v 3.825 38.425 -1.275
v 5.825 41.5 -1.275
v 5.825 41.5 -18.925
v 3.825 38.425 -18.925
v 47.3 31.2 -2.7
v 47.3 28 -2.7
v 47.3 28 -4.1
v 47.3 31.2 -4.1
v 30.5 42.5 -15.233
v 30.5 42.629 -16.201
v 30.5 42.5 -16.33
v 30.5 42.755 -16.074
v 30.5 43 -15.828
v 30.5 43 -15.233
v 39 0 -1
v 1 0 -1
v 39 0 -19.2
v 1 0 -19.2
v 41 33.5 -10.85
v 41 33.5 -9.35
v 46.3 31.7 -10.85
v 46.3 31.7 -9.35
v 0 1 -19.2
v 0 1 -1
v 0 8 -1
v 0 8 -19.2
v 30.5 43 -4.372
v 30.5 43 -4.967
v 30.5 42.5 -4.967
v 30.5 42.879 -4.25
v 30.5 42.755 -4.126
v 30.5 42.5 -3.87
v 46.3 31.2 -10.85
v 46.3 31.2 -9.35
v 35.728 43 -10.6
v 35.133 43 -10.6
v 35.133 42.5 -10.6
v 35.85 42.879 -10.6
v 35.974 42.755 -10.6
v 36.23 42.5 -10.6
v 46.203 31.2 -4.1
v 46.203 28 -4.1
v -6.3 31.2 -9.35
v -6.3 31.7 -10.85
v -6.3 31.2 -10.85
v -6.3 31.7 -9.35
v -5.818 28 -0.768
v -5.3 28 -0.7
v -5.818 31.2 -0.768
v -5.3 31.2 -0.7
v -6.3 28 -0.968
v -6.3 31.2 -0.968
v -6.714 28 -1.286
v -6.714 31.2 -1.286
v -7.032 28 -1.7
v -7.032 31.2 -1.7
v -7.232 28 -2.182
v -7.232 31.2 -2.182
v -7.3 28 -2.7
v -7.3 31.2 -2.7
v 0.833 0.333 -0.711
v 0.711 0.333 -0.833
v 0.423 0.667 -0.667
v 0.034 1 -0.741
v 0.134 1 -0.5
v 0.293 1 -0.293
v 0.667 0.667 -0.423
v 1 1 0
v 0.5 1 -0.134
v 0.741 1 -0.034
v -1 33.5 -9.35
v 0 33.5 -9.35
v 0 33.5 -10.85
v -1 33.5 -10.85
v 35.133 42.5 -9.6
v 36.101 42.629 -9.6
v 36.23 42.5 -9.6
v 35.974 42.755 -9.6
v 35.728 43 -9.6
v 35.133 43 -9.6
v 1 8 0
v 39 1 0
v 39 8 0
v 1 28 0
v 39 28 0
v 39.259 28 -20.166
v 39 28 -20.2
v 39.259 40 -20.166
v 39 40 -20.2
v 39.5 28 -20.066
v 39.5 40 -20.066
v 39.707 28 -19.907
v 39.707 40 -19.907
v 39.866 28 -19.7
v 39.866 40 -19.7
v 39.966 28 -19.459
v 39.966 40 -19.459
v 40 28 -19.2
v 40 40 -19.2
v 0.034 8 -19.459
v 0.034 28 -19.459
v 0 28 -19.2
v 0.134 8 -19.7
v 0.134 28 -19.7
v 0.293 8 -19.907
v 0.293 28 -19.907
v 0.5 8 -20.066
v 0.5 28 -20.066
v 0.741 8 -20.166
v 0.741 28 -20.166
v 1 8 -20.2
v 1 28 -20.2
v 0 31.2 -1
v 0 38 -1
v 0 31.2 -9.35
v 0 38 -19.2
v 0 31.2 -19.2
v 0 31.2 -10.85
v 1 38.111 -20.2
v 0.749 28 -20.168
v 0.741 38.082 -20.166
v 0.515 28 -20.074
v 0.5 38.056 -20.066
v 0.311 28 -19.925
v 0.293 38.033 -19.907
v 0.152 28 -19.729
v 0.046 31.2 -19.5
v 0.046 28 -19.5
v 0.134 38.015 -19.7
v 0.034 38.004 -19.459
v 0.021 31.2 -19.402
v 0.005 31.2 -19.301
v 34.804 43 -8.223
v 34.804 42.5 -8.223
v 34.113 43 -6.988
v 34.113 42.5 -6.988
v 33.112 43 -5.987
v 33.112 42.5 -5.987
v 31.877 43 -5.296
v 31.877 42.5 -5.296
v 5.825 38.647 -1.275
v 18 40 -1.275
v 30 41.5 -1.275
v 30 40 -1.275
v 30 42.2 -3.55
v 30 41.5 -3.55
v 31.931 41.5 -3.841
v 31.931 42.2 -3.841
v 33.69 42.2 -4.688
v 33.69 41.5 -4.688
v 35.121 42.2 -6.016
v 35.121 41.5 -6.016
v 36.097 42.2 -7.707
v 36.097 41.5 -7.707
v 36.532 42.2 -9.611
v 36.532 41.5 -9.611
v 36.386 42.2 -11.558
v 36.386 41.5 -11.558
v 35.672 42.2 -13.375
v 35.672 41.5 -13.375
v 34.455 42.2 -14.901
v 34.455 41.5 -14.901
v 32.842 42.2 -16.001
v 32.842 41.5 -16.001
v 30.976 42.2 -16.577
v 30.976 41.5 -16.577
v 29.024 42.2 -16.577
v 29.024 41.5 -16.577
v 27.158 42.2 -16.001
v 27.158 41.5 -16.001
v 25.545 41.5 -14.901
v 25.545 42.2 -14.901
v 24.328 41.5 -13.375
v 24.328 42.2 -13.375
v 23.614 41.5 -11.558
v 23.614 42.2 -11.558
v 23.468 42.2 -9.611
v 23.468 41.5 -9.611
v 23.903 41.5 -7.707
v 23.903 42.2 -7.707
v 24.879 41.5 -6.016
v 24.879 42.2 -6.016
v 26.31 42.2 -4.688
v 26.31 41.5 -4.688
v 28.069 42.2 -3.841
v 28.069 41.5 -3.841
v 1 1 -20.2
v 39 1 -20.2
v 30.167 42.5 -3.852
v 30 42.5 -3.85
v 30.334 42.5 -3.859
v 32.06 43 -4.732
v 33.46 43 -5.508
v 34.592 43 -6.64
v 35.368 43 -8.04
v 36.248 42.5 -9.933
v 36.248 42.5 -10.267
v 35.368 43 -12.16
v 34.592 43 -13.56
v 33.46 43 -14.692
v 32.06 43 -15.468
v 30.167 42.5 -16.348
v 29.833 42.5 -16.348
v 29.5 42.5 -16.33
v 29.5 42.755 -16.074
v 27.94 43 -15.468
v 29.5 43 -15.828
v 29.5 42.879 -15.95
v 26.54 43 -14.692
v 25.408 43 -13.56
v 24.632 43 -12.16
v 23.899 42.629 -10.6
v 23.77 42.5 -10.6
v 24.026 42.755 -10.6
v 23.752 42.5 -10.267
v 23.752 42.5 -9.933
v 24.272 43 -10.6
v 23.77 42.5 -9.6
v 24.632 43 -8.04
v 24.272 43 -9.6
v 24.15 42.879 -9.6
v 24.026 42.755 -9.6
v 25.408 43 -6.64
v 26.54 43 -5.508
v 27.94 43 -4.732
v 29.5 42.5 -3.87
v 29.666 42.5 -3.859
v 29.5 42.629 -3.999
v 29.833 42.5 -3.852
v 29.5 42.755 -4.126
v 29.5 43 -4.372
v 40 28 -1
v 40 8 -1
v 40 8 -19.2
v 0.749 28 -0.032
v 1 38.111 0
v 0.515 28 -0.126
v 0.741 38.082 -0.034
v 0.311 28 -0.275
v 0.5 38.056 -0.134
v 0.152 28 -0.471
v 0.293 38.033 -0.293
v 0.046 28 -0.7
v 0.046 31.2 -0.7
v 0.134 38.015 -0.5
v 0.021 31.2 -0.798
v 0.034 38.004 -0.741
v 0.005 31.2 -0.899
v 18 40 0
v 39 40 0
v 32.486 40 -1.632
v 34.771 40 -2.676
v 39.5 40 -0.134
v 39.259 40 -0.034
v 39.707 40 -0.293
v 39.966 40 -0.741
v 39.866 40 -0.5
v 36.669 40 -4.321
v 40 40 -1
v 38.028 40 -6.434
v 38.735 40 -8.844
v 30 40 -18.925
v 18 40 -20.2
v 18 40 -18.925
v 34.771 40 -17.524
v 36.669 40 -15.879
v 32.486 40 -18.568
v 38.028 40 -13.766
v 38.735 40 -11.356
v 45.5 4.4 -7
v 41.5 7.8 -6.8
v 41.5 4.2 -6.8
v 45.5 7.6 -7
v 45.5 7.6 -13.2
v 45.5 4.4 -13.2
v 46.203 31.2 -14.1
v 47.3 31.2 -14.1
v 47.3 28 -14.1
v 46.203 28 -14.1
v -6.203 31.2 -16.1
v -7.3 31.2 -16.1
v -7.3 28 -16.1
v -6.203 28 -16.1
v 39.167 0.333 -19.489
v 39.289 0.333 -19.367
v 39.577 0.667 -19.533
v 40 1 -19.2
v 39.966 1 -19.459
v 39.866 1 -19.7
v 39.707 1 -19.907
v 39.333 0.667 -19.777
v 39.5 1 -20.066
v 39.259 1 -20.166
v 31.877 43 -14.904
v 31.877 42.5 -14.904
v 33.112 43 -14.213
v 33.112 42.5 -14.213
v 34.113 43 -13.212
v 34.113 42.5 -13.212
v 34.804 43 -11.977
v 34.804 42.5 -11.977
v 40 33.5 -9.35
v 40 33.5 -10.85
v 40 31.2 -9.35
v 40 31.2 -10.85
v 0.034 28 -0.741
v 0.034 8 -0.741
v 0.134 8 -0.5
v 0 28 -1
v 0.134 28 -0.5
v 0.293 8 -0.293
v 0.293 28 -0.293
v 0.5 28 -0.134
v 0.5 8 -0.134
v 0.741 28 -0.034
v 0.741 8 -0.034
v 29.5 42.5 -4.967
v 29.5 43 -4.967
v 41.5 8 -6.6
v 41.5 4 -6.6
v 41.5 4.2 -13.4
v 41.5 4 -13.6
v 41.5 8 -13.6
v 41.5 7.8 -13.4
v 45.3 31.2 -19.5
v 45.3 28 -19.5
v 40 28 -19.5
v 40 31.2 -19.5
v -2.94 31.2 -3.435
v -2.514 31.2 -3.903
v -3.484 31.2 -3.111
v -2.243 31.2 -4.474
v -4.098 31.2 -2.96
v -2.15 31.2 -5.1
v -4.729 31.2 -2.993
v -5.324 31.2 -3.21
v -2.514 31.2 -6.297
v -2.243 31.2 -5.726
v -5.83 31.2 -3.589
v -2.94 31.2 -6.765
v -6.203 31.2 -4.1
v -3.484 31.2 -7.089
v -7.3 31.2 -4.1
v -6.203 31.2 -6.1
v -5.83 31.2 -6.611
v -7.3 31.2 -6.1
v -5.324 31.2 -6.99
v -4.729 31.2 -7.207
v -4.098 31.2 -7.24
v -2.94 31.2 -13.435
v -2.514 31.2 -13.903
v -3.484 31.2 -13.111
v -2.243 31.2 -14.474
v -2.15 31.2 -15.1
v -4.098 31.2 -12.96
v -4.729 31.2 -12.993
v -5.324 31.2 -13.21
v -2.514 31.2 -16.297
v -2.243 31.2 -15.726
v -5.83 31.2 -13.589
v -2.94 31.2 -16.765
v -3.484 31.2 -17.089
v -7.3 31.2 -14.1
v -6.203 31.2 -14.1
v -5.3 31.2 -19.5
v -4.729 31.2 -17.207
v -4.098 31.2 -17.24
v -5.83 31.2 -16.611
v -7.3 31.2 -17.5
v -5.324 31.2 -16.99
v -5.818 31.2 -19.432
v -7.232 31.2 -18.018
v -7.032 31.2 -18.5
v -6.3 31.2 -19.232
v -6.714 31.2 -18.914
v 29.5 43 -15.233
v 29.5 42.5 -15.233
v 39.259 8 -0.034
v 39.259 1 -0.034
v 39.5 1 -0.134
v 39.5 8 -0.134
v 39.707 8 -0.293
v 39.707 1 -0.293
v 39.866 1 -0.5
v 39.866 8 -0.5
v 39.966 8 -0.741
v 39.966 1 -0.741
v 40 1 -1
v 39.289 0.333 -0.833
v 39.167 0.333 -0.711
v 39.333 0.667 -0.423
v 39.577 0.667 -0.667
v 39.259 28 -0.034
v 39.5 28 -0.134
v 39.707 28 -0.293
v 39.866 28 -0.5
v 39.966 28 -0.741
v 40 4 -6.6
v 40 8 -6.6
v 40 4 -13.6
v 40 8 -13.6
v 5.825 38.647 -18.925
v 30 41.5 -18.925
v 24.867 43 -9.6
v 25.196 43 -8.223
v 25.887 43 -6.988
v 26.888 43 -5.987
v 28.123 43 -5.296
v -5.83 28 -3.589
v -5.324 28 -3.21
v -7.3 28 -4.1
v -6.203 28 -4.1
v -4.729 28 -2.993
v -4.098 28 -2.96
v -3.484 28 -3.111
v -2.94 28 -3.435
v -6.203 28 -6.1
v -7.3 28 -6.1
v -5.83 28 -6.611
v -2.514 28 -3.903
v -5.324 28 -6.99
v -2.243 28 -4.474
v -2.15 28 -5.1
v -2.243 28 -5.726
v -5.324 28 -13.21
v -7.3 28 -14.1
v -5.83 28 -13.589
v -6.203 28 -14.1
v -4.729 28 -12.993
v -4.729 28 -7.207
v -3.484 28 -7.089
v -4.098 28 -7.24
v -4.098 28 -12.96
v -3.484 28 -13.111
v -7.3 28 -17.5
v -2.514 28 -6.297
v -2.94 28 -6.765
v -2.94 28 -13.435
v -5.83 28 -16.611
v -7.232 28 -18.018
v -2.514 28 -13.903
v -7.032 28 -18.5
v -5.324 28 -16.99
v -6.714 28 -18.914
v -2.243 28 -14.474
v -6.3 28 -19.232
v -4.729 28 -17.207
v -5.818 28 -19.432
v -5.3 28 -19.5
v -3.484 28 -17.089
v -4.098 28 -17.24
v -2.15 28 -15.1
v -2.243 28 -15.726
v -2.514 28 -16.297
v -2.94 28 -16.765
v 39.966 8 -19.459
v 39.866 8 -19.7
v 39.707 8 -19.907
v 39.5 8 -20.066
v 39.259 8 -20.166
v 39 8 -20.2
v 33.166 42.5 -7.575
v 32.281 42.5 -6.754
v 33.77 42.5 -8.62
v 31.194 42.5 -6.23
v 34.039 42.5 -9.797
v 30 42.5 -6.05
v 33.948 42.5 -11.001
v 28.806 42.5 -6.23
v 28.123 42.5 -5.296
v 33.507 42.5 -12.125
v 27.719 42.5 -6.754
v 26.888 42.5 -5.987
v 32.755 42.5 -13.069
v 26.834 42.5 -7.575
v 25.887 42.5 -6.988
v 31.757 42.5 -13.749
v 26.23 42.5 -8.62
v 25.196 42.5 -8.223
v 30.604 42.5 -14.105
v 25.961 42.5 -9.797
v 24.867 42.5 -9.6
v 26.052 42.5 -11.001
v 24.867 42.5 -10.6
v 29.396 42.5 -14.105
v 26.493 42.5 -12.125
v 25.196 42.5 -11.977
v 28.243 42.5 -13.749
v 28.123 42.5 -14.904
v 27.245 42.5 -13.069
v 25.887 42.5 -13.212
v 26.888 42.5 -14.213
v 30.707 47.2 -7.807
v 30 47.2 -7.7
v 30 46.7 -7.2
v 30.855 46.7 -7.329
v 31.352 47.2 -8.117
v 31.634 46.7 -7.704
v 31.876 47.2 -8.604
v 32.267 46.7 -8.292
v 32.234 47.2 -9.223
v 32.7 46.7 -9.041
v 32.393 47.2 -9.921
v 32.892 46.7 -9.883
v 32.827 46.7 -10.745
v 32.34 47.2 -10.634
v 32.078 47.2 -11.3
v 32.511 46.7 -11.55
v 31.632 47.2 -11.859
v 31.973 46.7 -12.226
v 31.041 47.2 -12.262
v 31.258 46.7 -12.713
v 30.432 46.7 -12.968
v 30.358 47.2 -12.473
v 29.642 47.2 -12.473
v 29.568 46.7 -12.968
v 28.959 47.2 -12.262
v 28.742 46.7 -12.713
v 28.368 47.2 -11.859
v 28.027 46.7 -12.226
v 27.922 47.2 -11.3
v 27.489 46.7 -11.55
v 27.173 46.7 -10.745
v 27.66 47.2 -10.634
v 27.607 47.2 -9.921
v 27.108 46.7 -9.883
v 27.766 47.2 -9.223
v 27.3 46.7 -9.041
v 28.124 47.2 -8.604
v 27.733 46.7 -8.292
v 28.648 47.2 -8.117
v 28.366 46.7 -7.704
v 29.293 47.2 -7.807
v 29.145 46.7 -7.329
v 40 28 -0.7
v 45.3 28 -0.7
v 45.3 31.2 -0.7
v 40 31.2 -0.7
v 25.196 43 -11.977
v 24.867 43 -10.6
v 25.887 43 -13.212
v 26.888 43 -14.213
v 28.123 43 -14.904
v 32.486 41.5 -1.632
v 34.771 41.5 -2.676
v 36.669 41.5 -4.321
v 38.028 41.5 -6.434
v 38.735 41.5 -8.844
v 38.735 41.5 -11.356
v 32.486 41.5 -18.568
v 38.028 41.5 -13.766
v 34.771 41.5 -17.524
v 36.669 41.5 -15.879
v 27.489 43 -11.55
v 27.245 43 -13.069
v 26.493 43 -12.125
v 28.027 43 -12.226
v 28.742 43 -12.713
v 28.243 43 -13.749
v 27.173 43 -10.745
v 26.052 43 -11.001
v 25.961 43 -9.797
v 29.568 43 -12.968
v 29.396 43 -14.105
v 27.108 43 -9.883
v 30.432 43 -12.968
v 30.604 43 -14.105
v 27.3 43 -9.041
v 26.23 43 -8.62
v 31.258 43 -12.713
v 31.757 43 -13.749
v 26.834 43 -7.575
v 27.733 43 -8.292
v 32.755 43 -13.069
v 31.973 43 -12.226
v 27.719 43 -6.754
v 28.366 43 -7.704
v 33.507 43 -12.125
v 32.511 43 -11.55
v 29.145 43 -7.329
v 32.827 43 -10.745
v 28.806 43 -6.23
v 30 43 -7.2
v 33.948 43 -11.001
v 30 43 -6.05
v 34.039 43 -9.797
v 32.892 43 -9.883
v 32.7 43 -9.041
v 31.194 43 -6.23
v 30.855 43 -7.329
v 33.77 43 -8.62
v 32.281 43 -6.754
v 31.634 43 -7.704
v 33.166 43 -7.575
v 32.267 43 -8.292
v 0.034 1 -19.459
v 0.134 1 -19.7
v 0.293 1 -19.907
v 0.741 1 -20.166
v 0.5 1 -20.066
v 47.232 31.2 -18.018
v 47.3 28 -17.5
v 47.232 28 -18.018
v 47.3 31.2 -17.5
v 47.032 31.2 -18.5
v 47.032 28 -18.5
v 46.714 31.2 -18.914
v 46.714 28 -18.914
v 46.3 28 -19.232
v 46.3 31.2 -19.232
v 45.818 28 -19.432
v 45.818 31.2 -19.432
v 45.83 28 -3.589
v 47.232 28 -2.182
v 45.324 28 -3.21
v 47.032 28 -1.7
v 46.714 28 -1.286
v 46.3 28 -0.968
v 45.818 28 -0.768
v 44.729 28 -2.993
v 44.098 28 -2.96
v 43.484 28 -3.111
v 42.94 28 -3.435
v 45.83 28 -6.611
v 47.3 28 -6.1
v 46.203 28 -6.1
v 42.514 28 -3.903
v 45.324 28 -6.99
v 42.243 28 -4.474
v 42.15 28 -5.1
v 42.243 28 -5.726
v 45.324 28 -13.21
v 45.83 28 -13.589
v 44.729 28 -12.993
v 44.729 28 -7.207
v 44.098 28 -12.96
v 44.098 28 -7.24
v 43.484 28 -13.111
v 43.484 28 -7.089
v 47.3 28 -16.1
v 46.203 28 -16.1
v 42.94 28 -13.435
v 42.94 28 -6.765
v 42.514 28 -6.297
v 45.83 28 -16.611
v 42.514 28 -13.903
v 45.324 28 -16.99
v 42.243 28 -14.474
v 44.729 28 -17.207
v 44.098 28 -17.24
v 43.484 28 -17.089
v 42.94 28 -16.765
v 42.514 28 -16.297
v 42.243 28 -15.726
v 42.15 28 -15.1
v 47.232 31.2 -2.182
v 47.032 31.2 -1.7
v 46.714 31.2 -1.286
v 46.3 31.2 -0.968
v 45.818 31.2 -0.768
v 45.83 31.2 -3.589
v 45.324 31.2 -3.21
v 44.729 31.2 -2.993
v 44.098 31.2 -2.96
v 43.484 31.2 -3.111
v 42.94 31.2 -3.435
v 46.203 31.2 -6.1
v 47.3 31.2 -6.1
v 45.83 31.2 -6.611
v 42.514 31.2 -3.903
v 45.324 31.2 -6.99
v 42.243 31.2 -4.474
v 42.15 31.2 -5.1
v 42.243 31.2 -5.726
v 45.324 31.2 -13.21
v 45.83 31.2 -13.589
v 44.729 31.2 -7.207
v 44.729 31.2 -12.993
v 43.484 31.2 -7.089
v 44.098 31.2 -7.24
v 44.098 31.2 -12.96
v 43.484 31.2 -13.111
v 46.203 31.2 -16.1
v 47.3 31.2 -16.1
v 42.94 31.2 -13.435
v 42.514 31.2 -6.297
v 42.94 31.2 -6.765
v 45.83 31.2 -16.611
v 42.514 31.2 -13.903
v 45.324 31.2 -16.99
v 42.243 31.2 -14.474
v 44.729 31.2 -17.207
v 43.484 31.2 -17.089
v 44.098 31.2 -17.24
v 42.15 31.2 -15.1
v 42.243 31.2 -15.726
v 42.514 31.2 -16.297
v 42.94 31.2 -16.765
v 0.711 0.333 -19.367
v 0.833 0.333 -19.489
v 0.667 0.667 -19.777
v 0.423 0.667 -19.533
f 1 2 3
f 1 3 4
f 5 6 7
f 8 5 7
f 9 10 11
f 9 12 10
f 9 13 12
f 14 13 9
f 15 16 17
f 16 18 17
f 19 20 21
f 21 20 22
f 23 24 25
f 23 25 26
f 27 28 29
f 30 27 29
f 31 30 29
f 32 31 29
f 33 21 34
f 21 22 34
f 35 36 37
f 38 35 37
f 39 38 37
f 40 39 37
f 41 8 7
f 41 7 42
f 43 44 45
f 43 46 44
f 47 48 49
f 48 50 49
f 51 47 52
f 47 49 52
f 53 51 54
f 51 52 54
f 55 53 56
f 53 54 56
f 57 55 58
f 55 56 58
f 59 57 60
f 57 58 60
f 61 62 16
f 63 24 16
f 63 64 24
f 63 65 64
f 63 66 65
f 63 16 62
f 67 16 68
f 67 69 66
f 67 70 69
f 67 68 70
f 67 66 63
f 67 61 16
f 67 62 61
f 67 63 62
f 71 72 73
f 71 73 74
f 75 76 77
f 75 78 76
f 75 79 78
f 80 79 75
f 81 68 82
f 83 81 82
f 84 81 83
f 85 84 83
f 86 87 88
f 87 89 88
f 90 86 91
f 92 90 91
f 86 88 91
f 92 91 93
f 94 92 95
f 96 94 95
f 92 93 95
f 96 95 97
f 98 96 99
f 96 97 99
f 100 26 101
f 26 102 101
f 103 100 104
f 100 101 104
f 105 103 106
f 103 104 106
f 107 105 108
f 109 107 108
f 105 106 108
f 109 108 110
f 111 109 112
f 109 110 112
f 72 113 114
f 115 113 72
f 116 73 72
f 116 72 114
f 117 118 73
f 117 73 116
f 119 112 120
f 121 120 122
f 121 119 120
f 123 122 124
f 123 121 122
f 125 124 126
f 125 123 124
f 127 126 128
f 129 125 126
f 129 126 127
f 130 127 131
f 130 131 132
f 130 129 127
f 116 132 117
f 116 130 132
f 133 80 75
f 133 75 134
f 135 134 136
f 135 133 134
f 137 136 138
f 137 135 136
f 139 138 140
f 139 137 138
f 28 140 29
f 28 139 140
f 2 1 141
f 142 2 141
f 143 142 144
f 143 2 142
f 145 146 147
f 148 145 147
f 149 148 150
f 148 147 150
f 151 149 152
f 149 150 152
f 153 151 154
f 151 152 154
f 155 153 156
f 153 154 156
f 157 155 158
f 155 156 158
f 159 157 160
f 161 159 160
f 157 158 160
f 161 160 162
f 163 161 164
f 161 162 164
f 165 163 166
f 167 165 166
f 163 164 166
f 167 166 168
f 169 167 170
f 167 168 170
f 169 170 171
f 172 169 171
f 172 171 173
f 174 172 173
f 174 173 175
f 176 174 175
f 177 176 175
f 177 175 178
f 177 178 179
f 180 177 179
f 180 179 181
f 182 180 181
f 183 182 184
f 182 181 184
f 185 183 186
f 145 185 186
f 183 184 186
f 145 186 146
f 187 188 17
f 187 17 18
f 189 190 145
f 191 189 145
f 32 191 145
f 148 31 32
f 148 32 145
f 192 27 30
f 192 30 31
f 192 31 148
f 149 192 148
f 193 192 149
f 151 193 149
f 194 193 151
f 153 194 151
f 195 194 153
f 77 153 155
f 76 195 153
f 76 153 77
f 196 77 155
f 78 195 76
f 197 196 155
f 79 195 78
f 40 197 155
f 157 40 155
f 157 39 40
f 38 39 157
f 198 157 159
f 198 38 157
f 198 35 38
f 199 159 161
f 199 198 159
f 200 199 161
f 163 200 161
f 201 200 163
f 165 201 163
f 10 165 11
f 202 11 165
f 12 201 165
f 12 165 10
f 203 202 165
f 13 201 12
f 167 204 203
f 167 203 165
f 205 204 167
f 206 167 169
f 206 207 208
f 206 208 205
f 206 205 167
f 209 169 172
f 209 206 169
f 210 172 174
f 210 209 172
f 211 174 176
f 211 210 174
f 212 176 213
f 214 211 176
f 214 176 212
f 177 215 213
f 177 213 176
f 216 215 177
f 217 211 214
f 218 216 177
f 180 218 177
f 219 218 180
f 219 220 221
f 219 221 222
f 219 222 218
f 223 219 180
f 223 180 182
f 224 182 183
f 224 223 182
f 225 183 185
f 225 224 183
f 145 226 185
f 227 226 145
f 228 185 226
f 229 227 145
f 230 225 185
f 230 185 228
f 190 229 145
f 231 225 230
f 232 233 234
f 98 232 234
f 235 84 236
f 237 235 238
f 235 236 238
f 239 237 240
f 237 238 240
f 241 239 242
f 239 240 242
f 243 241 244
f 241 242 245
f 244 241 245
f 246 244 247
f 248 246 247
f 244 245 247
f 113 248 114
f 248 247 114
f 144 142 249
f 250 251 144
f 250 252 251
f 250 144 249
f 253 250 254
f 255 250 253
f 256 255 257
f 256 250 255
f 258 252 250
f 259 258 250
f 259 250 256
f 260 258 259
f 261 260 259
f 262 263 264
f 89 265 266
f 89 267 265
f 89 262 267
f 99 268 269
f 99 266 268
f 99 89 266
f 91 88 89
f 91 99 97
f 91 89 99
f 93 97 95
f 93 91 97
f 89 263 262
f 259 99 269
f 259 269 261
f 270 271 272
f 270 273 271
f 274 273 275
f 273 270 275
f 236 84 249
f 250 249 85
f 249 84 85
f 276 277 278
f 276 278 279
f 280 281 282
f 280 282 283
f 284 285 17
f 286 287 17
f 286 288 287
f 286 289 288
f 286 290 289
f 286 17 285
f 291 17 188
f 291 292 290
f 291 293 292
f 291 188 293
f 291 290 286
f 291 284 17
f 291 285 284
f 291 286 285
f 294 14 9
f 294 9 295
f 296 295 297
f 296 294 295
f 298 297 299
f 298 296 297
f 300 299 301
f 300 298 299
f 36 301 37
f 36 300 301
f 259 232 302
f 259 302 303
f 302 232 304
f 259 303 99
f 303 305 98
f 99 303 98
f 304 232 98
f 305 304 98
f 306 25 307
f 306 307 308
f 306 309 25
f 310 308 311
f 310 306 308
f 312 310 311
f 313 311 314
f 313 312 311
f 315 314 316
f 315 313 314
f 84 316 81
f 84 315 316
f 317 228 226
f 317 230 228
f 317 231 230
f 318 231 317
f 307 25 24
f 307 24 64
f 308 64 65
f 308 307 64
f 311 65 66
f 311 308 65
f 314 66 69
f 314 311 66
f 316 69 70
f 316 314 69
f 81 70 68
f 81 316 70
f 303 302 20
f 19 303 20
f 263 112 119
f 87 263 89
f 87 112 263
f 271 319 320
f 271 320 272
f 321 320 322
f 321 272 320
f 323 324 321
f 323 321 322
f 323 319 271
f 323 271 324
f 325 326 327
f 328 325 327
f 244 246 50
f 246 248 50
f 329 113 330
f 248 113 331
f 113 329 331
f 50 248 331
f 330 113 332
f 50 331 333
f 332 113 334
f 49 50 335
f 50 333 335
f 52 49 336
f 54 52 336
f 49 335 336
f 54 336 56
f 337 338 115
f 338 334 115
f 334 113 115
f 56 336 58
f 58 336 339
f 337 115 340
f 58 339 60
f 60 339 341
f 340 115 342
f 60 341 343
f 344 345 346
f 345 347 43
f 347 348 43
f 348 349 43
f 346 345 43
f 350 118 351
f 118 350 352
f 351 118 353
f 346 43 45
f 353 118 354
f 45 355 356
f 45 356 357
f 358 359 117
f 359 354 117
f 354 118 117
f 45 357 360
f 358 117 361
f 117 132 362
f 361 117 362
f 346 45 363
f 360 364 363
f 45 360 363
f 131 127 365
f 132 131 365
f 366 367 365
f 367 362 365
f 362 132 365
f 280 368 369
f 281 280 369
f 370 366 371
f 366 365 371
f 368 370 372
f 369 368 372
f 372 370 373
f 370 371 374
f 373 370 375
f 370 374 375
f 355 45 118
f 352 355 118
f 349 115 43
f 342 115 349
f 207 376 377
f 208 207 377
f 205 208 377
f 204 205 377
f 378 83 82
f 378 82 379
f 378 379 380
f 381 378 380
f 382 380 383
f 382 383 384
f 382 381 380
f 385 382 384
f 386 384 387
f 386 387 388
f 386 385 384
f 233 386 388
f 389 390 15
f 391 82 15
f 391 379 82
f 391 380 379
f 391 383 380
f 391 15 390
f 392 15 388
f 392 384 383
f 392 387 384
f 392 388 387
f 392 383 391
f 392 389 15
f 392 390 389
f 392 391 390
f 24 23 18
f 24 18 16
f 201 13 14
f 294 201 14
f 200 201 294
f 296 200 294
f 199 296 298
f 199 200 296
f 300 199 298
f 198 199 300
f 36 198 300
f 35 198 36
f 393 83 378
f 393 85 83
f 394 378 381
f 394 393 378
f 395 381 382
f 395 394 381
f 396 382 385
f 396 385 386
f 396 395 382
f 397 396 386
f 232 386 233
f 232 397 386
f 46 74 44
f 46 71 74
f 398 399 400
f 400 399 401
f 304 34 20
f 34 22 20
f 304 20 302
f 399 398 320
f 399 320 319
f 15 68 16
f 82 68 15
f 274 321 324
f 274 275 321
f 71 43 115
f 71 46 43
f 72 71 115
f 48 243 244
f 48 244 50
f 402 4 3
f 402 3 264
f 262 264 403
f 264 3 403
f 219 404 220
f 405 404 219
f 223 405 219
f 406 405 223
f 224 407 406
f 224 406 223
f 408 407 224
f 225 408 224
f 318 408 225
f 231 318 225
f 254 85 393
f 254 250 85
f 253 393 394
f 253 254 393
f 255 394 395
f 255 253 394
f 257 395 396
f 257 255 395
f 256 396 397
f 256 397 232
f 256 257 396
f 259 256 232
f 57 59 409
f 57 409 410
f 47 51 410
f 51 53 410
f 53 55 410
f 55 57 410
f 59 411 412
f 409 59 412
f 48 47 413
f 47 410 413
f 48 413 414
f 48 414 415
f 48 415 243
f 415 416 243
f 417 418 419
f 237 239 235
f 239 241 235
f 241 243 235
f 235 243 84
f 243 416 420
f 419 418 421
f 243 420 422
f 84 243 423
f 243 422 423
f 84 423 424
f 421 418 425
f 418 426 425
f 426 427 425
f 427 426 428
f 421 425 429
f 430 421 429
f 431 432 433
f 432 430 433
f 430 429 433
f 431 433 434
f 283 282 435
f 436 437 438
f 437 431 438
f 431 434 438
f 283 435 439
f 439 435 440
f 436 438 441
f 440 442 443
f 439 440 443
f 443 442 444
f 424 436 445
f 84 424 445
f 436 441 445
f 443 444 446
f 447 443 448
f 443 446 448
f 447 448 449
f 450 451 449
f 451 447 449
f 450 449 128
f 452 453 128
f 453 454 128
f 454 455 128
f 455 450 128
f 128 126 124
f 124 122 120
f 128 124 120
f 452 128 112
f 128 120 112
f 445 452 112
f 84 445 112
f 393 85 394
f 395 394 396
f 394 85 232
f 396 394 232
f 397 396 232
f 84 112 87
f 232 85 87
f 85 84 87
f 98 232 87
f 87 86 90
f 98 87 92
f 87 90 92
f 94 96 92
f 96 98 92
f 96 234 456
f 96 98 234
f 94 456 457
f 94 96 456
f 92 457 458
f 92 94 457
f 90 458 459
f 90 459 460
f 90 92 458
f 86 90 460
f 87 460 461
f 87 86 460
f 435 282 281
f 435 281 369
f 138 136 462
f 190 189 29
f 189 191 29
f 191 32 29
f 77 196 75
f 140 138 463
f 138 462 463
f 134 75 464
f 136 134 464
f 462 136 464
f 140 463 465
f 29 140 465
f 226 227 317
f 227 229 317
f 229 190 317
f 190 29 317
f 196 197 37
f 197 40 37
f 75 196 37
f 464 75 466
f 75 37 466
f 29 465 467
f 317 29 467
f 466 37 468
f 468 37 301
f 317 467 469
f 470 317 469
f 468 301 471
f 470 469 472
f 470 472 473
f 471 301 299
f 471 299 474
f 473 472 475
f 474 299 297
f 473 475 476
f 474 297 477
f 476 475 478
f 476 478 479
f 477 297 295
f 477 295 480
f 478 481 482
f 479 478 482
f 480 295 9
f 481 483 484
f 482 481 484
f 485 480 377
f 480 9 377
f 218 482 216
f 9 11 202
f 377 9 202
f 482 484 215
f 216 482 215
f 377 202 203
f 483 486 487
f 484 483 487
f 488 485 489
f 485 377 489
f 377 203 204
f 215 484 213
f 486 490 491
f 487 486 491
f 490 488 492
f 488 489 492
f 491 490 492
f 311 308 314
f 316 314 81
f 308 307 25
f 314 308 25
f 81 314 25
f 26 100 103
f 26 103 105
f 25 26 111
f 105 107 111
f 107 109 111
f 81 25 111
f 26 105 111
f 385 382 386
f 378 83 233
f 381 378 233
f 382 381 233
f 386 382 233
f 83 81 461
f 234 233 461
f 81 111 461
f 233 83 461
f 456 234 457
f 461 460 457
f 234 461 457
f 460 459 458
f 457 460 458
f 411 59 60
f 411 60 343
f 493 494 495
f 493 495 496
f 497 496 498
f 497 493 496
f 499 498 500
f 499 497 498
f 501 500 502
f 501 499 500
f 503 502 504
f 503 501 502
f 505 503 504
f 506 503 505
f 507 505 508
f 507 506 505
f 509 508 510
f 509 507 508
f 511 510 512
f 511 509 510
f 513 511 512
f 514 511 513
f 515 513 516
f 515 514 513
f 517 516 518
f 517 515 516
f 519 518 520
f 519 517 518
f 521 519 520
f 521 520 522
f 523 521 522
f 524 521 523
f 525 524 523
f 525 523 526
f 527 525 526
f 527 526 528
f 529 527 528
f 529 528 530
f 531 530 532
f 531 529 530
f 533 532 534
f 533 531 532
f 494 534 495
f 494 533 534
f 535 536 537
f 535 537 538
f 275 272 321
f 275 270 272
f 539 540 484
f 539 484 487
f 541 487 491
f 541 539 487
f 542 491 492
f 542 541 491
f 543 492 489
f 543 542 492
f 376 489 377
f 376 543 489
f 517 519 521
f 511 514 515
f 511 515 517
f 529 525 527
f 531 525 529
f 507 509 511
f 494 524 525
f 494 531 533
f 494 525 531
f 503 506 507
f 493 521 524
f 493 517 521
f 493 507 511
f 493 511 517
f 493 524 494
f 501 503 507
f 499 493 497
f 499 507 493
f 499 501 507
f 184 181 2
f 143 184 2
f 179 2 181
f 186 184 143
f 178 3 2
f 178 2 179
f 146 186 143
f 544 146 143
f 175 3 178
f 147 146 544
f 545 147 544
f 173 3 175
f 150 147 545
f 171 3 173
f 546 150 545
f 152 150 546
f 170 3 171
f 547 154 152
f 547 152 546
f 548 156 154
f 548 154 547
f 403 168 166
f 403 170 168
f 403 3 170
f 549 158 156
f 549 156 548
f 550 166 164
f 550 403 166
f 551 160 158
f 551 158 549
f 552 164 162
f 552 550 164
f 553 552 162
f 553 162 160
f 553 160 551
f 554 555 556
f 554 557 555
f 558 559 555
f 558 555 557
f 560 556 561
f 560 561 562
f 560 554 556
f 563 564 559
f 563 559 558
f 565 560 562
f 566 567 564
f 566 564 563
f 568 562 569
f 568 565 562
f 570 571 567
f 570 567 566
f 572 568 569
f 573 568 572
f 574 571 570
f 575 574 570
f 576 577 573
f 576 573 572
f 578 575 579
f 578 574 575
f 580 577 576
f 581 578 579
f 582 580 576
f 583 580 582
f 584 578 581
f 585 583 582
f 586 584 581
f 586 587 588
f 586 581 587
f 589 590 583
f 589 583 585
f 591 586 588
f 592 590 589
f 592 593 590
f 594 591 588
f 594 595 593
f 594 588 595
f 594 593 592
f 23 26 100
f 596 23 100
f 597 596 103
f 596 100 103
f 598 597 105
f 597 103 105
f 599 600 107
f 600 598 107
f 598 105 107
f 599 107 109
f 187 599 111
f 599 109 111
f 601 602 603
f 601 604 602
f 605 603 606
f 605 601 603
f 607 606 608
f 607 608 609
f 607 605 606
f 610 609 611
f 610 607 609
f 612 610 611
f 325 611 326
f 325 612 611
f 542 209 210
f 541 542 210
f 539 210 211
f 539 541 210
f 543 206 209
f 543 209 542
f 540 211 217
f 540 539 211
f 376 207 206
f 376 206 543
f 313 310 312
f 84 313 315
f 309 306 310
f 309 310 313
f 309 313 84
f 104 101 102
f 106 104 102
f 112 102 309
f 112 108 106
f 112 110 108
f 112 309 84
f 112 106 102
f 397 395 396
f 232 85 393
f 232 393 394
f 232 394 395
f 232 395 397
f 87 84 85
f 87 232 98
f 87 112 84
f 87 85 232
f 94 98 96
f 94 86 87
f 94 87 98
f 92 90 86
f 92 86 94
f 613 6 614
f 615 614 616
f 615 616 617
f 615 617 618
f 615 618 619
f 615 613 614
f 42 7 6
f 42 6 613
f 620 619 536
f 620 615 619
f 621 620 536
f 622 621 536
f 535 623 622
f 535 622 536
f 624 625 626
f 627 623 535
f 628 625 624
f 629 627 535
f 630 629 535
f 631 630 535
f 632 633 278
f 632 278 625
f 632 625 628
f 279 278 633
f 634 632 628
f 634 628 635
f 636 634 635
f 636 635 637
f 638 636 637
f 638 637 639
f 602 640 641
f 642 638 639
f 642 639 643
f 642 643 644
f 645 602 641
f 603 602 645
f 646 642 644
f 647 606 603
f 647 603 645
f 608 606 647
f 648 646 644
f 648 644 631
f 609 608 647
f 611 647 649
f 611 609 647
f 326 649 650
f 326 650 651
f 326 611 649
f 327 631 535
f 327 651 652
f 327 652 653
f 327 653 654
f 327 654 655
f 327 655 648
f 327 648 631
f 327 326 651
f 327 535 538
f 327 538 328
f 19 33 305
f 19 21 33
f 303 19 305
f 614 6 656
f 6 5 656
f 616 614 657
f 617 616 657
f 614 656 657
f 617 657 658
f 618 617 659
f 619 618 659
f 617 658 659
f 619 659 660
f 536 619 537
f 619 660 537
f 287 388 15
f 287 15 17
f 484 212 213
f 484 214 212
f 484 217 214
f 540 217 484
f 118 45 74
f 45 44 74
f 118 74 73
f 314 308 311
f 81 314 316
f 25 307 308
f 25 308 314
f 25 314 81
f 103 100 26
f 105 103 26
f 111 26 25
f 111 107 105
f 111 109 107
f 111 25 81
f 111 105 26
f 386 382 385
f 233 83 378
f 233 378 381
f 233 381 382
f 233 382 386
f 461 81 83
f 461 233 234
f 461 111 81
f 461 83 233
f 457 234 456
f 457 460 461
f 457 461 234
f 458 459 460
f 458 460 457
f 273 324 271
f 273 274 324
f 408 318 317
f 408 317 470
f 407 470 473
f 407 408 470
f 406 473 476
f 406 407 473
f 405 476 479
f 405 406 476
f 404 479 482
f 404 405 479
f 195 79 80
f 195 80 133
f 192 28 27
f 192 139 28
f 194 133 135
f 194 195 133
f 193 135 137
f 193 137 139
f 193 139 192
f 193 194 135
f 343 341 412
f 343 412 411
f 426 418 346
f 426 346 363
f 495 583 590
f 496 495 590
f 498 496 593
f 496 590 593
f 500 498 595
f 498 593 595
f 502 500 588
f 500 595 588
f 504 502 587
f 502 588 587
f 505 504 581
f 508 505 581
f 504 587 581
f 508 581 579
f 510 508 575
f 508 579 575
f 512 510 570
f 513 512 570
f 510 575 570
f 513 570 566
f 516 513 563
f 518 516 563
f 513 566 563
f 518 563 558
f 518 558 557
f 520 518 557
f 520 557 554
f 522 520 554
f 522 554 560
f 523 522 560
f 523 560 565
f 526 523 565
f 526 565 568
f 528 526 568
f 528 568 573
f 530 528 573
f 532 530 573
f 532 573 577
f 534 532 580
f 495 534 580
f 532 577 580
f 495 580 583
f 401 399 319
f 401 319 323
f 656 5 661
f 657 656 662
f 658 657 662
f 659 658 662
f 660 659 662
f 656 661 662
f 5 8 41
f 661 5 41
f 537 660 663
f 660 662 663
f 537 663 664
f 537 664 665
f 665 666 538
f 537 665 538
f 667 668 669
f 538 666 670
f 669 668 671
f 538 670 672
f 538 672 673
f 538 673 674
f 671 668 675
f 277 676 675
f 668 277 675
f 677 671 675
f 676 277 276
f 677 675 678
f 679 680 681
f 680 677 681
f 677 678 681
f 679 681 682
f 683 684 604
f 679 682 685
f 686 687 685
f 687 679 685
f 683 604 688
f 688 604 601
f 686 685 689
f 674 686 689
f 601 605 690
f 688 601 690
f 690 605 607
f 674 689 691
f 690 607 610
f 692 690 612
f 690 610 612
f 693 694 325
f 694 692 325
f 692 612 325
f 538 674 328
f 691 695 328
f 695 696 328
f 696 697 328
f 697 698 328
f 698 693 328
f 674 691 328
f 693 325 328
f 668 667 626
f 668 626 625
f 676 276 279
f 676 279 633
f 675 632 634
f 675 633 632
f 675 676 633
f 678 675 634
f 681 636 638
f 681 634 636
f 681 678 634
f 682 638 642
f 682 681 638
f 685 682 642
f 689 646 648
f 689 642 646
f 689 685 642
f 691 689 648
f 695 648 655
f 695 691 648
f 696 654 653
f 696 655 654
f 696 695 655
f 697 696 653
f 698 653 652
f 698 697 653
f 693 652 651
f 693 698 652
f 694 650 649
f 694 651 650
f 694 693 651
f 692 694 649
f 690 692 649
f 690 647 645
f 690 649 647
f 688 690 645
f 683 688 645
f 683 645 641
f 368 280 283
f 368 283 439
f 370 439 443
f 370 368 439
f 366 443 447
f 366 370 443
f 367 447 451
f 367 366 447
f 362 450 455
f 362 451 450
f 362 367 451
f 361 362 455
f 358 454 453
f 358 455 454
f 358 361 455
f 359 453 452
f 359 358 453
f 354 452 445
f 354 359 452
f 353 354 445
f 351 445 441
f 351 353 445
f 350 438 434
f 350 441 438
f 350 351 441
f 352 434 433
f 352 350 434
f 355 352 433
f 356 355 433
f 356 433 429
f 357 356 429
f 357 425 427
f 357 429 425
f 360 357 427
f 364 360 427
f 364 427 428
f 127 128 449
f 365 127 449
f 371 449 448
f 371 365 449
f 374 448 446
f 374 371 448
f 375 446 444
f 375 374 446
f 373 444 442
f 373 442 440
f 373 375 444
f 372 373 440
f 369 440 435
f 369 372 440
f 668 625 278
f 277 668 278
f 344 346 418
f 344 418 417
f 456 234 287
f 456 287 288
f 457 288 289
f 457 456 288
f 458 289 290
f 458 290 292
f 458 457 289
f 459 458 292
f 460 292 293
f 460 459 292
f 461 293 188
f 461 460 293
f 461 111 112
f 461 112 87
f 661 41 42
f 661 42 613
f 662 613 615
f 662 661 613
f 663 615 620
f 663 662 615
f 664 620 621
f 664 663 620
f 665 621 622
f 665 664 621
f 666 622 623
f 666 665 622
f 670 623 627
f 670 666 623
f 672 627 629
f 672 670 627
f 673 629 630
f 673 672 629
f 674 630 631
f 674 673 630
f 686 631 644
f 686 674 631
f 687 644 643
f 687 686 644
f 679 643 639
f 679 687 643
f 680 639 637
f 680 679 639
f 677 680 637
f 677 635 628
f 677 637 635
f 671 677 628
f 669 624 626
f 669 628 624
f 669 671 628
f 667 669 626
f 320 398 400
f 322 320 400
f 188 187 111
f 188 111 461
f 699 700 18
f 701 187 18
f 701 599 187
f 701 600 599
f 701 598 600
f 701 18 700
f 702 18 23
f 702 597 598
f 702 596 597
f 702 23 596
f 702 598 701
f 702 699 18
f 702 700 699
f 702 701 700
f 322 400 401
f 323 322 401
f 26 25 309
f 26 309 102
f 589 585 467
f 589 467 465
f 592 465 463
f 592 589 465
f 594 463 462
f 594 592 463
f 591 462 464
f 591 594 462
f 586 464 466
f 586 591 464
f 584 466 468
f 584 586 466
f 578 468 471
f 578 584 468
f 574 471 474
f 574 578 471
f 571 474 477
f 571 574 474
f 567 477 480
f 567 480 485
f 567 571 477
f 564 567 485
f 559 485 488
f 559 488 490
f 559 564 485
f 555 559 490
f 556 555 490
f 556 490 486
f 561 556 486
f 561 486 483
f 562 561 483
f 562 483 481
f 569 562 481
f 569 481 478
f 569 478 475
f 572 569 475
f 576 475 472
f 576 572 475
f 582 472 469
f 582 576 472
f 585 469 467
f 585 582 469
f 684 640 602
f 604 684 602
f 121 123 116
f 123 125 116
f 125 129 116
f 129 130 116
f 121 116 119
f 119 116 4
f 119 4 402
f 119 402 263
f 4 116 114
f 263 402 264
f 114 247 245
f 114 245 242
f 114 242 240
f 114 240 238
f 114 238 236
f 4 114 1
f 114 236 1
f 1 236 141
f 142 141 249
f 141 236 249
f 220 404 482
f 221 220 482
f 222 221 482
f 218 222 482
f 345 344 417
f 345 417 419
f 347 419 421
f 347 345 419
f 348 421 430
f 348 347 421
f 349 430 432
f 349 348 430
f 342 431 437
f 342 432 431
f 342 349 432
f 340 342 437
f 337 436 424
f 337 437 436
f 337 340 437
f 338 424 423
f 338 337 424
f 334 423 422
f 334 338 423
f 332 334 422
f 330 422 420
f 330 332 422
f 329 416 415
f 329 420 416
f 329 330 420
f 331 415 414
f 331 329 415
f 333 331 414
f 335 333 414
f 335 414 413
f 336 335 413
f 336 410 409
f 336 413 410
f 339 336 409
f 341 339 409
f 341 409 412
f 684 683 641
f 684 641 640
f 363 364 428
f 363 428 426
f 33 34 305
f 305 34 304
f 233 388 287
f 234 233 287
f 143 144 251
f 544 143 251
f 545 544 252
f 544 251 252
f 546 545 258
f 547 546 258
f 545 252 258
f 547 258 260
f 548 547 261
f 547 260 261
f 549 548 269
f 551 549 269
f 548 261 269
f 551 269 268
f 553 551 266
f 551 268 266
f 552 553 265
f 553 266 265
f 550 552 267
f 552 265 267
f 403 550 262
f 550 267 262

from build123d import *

# Parameters (mm, degrees)
SKETCH1_W                       = 40
SKETCH1_H                       = 20.2
BOSS_EXTRUDE1_DEPTH             = 8
SKETCH3_W                       = 40
SKETCH3_H                       = 20.2
BOSS_EXTRUDE2_DEPTH             = 20
SKETCH4_W                       = 40
SKETCH4_H                       = 20.2
BOSS_EXTRUDE5_DEPTH             = 12
CUT_EXTRUDE1_DEPTH              = 61.066962633
SKETCH6_W                       = 7.3
SKETCH6_H                       = 18.8
BOSS_EXTRUDE6_DEPTH             = 3.2
BOSS_EXTRUDE6_2_DEPTH           = 3.2
CUT_EXTRUDE2_DEPTH              = 61.156213312
BOSS_EXTRUDE7_DEPTH             = 0.75
FILLET1_R                       = 2
FILLET3_R                       = 2
BOSS_EXTRUDE8_DEPTH             = 1.5
BOSS_EXTRUDE8_DIRECTION_2_REACH = 67.156
BOSS_EXTRUDE9_DEPTH             = 17.65
SKETCH11_R                      = 6.55
BOSS_EXTRUDE10_DEPTH            = 1.5
CHAMFER1_SIZE                   = 0.8
SKETCH12_R                      = 4.05
CUT_EXTRUDE3_DEPTH              = 0.5
SKETCH13_R                      = 2.9
BOSS_EXTRUDE11_DEPTH            = 4.2
CHAMFER2_SIZE                   = 0.5
FILLET4_R                       = 1
FILLET5_R                       = 1
FILLET6_R                       = 1
CHAMFER3_SIZE                   = 1
SKETCH14_W                      = 7
SKETCH14_H                      = 4
BOSS_EXTRUDE13_DEPTH            = 1.5


with BuildPart() as part:
    # Sketch1 → Boss-Extrude1 (new body)
    with BuildSketch(Plane(origin=(0, 0, 0), x_dir=(1, 0, 0), z_dir=(0, 1, 0))):
        with Locations((20, 10.1)):
            Rectangle(SKETCH1_W, SKETCH1_H)
    extrude(amount=BOSS_EXTRUDE1_DEPTH)

    # Fillet5
    fillet5_edges = [part.edges().sort_by_distance(p)[0] for p in [
        (0, 4, -20.2),
        (40, 4, -20.2),
        (40, 4, 0),
        (0, 4, 0),
    ]]
    fillet(fillet5_edges, radius=FILLET5_R)

    # Chamfer3
    chamfer3_edges = [part.edges().sort_by_distance(p)[0] for p in [
        (20, 0, 0),
        (0, 0, -10.1),
        (20, 0, -20.2),
        (40, 0, -10.1),
        (39.707106781, 0, -19.907106781),
        (39.707106781, 0, -0.292893219),
        (0.292893219, 0, -19.907106781),
        (0.292893219, 0, -0.292893219),
    ]]
    chamfer(chamfer3_edges, length=CHAMFER3_SIZE)


with BuildPart() as body_2:
    # Sketch3 → Boss-Extrude2 (new body)
    with BuildSketch(Plane(origin=(0, 8, 0), x_dir=(1, 0, 0), z_dir=(0, 1, 0))):
        with Locations((20, 10.1)):
            Rectangle(SKETCH3_W, SKETCH3_H)
    extrude(amount=BOSS_EXTRUDE2_DEPTH)

    # Fillet6
    fillet6_edges = [body_2.edges().sort_by_distance(p)[0] for p in [
        (0, 18, -20.2),
        (40, 18, -20.2),
        (40, 18, 0),
        (0, 18, 0),
    ]]
    fillet(fillet6_edges, radius=FILLET6_R)


with BuildPart() as body_3:
    # Sketch4 → Boss-Extrude5 (new body)
    with BuildSketch(Plane(origin=(0, 28, 0), x_dir=(1, 0, 0), z_dir=(0, 1, 0))):
        with Locations((20, 10.1)):
            Rectangle(SKETCH4_W, SKETCH4_H)
    extrude(amount=BOSS_EXTRUDE5_DEPTH)

    # Sketch5 → Cut-Extrude1 (cut, through all)
    with BuildSketch(Plane.XY):
        Polygon((0, 38), (18, 40), (0, 40), align=None)
    extrude(amount=-CUT_EXTRUDE1_DEPTH, mode=Mode.SUBTRACT)



with BuildPart() as body_4:
    # Sketch6 → Boss-Extrude6 (new body)
    with BuildSketch(Plane(origin=(0, 28, 0), x_dir=(-1, 0, 0), z_dir=(0, -1, 0))):
        with Locations((3.65, 10.1)):
            Rectangle(SKETCH6_W, SKETCH6_H)
    extrude(amount=-BOSS_EXTRUDE6_DEPTH)


with BuildPart() as body_5:
    # Sketch6 → Boss-Extrude6 2 (new body)
    with BuildSketch(Plane(origin=(0, 28, 0), x_dir=(-1, 0, 0), z_dir=(0, -1, 0))):
        with Locations((-43.65, 10.1)):
            Rectangle(SKETCH6_W, SKETCH6_H)
    extrude(amount=-BOSS_EXTRUDE6_2_DEPTH)


with BuildPart() as cut_extrude2_tool:
    # Sketch7 → Cut-Extrude2 (new, through all)
    with BuildSketch(Plane(origin=(0, 31.2, 0), x_dir=(1, 0, 0), z_dir=(0, 1, 0))):
        with BuildLine():
            Line((-6.203286631, 4.1), (-7.3, 4.1))
            Line((-7.3, 4.1), (-7.3, 6.1))
            Line((-7.3, 6.1), (-6.203286631, 6.1))
            ThreePointArc((-6.203286631, 6.1), (-2.15, 5.1), (-6.203286631, 4.1))
        make_face()
        with BuildLine():
            Line((-6.203286631, 14.1), (-7.3, 14.1))
            Line((-7.3, 14.1), (-7.3, 16.1))
            Line((-7.3, 16.1), (-6.203286631, 16.1))
            ThreePointArc((-6.203286631, 16.1), (-2.15, 15.1), (-6.203286631, 14.1))
        make_face()
        with BuildLine():
            Line((46.203286631, 6.1), (47.3, 6.1))
            Line((47.3, 6.1), (47.3, 4.1))
            Line((47.3, 4.1), (46.203286631, 4.1))
            ThreePointArc((46.203286631, 4.1), (42.15, 5.1), (46.203286631, 6.1))
        make_face()
        with BuildLine():
            Line((46.203286631, 16.1), (47.3, 16.1))
            Line((47.3, 16.1), (47.3, 14.1))
            Line((47.3, 14.1), (46.203286631, 14.1))
            ThreePointArc((46.203286631, 14.1), (42.15, 15.1), (46.203286631, 16.1))
        make_face()
    extrude(amount=-CUT_EXTRUDE2_DEPTH)


with BuildPart() as body_4_1:
    add(body_4.part)

    # Cut-Extrude2: cut by cut_extrude2_tool
    add(cut_extrude2_tool.part, mode=Mode.SUBTRACT)


with BuildPart() as body_5_1:
    add(body_5.part)

    # Cut-Extrude2: cut by cut_extrude2_tool
    add(cut_extrude2_tool.part, mode=Mode.SUBTRACT)

    # Fillet3
    fillet3_edges = [body_5_1.edges().sort_by_distance(p)[0] for p in [
        (47.3, 29.6, -19.5),
        (47.3, 29.6, -0.7),
    ]]
    fillet(fillet3_edges, radius=FILLET3_R)


with BuildPart() as body_3_1:
    add(body_3.part)

    add(body_4_1.part)  # Boss-Extrude7 merges body 4
    # Sketch8 → Boss-Extrude7 (add, symmetric)
    with BuildSketch(Plane.XY.offset(-10.1)):
        Polygon((-6.3, 31.2), (0, 31.2), (0, 33.5), (-1, 33.5), (-6.3, 31.7), align=None)
    boss_extrude7 = extrude(amount=BOSS_EXTRUDE7_DEPTH, both=True)

    # Fillet1
    fillet1_edges = [body_3_1.edges().sort_by_distance(p)[0] for p in [
        (-7.3, 29.6, -19.5),
        (-7.3, 29.6, -0.7),
    ]]
    fillet(fillet1_edges, radius=FILLET1_R)

    # Mirror12: Boss-Extrude7 across plane
    add(boss_extrude7.mirror(Plane.ZY.offset(-20)))

    # Sketch9 → Boss-Extrude8 (add)
    with BuildSketch(Plane(origin=(0, 40, 0), x_dir=(1, 0, 0), z_dir=(0, 1, 0))):
        with BuildLine():
            Line((30, 18.925), (5.825, 18.925))
            Line((5.825, 18.925), (5.825, 1.275))
            Line((5.825, 1.275), (30, 1.275))
            ThreePointArc((30, 1.275), (38.825, 10.1), (30, 18.925))
        make_face()
    extrude(amount=BOSS_EXTRUDE8_DEPTH)

    # Sketch9 → Boss-Extrude8 direction 2 (add, up to next)
    with BuildSketch(Plane(origin=(0, 40, 0), x_dir=(1, 0, 0), z_dir=(0, 1, 0)), mode=Mode.PRIVATE) as boss_extrude8_direction_2_sk1:
        with BuildLine():
            Line((30, 18.925), (5.825, 18.925))
            Line((5.825, 18.925), (5.825, 1.275))
            Line((5.825, 1.275), (30, 1.275))
            ThreePointArc((30, 1.275), (38.825, 10.1), (30, 18.925))
        make_face()
    boss_extrude8_direction_2_tool1 = extrude(boss_extrude8_direction_2_sk1.sketch, amount=-BOSS_EXTRUDE8_DIRECTION_2_REACH, mode=Mode.PRIVATE) - body_3_1.part
    add(boss_extrude8_direction_2_tool1.solids().sort_by_distance((21.440432, 40, -10.1))[0])

    # Sketch10 → Boss-Extrude9 (add)
    with BuildSketch(Plane.XY.offset(-1.275)):
        Polygon((5.825, 41.5), (3.825, 38.425), (5.825, 38.647222222), align=None)
    extrude(amount=-BOSS_EXTRUDE9_DEPTH)

    # Sketch11 → Boss-Extrude10 (add)
    with BuildSketch(Plane(origin=(0, 41.5, 0), x_dir=(1, 0, 0), z_dir=(0, 1, 0))):
        with Locations(Location((30, 10.1, 0), (0, 0, 270))):
            Circle(SKETCH11_R)
    extrude(amount=BOSS_EXTRUDE10_DEPTH)

    # Chamfer1
    chamfer1_edges = [body_3_1.edges().sort_by_distance(p)[0] for p in [
        (30, 43, -16.65),
    ]]
    chamfer(chamfer1_edges, length=CHAMFER1_SIZE)

    # Sketch12 → Cut-Extrude3 (cut)
    with BuildSketch(Plane(origin=(0, 43, 0), x_dir=(1, 0, 0), z_dir=(0, 1, 0))):
        with BuildLine():
            Line((29.5, 15.233183841), (29.5, 16.630888148))
            ThreePointArc((29.5, 16.630888148), (30, 16.65), (30.5, 16.630888148))
            Line((30.5, 16.630888148), (30.5, 15.233183841))
            ThreePointArc((30.5, 15.233183841), (33.646887464, 13.746887464), (35.133183841, 10.6))
            Line((35.133183841, 10.6), (36.530888148, 10.6))
            ThreePointArc((36.530888148, 10.6), (36.55, 10.1), (36.530888148, 9.6))
            Line((36.530888148, 9.6), (35.133183841, 9.6))
            ThreePointArc((35.133183841, 9.6), (33.646887464, 6.453112536), (30.5, 4.966816159))
            Line((30.5, 4.966816159), (30.5, 3.569111852))
            ThreePointArc((30.5, 3.569111852), (30, 3.55), (29.5, 3.569111852))
            Line((29.5, 3.569111852), (29.5, 4.966816159))
            ThreePointArc((29.5, 4.966816159), (26.353112536, 6.453112536), (24.866816159, 9.6))
            Line((24.866816159, 9.6), (23.469111852, 9.6))
            ThreePointArc((23.469111852, 9.6), (23.45, 10.1), (23.469111852, 10.6))
            Line((23.469111852, 10.6), (24.866816159, 10.6))
            ThreePointArc((24.866816159, 10.6), (26.353112536, 13.746887464), (29.5, 15.233183841))
        make_face()
        with Locations(Location((30, 10.1, 0), (0, 0, 270))):
            Circle(SKETCH12_R, mode=Mode.SUBTRACT)
    extrude(amount=-CUT_EXTRUDE3_DEPTH, mode=Mode.SUBTRACT)

    # Sketch13 → Boss-Extrude11 (add)
    with BuildSketch(Plane(origin=(0, 43, 0), x_dir=(1, 0, 0), z_dir=(0, 1, 0))):
        with Locations(Location((30, 10.1, 0), (0, 0, 270))):
            Circle(SKETCH13_R)
    extrude(amount=BOSS_EXTRUDE11_DEPTH)

    # Chamfer2
    chamfer2_edges = [body_3_1.edges().sort_by_distance(p)[0] for p in [
        (30, 47.2, -13),
    ]]
    chamfer(chamfer2_edges, length=CHAMFER2_SIZE)

    # Fillet4
    fillet4_edges = [body_3_1.edges().sort_by_distance(p)[0] for p in [
        (0, 33, -20.2),
        (40, 34, -20.2),
        (40, 34, 0),
        (0, 33, 0),
    ]]
    fillet(fillet4_edges, radius=FILLET4_R)


with BuildPart() as body_5_2:
    # Sketch14 → Boss-Extrude13 (new body)
    with BuildSketch(Plane(origin=(40, 0, 0), x_dir=(0, 0, -1), z_dir=(1, 0, 0))):
        with Locations((10.1, 6)):
            Rectangle(SKETCH14_W, SKETCH14_H)
    extrude(amount=BOSS_EXTRUDE13_DEPTH)

    # Sketch15 → Loft1 section 0
    with BuildSketch(Plane(origin=(41.5, 0, 0), x_dir=(0, 0, -1), z_dir=(1, 0, 0))):
        with BuildLine():
            Line((6.8, 7.8), (6.8, 4.2))
            Line((6.8, 4.2), (13.4, 4.2))
            Line((13.4, 4.2), (13.4, 7.8))
            Line((13.4, 7.8), (6.8, 7.8))
        make_face()
    # Sketch16 → Loft1 section 1
    with BuildSketch(Plane(origin=(45.5, 0, 0), x_dir=(0, 0, -1), z_dir=(1, 0, 0))):
        with BuildLine():
            Line((7, 7.6), (7, 4.4))
            Line((7, 4.4), (13.2, 4.4))
            Line((13.2, 4.4), (13.2, 7.6))
            Line((13.2, 7.6), (7, 7.6))
        make_face()
    loft()


solid = Compound([part.part, body_2.part, body_5_1.part, body_3_1.part, body_5_2.part])
